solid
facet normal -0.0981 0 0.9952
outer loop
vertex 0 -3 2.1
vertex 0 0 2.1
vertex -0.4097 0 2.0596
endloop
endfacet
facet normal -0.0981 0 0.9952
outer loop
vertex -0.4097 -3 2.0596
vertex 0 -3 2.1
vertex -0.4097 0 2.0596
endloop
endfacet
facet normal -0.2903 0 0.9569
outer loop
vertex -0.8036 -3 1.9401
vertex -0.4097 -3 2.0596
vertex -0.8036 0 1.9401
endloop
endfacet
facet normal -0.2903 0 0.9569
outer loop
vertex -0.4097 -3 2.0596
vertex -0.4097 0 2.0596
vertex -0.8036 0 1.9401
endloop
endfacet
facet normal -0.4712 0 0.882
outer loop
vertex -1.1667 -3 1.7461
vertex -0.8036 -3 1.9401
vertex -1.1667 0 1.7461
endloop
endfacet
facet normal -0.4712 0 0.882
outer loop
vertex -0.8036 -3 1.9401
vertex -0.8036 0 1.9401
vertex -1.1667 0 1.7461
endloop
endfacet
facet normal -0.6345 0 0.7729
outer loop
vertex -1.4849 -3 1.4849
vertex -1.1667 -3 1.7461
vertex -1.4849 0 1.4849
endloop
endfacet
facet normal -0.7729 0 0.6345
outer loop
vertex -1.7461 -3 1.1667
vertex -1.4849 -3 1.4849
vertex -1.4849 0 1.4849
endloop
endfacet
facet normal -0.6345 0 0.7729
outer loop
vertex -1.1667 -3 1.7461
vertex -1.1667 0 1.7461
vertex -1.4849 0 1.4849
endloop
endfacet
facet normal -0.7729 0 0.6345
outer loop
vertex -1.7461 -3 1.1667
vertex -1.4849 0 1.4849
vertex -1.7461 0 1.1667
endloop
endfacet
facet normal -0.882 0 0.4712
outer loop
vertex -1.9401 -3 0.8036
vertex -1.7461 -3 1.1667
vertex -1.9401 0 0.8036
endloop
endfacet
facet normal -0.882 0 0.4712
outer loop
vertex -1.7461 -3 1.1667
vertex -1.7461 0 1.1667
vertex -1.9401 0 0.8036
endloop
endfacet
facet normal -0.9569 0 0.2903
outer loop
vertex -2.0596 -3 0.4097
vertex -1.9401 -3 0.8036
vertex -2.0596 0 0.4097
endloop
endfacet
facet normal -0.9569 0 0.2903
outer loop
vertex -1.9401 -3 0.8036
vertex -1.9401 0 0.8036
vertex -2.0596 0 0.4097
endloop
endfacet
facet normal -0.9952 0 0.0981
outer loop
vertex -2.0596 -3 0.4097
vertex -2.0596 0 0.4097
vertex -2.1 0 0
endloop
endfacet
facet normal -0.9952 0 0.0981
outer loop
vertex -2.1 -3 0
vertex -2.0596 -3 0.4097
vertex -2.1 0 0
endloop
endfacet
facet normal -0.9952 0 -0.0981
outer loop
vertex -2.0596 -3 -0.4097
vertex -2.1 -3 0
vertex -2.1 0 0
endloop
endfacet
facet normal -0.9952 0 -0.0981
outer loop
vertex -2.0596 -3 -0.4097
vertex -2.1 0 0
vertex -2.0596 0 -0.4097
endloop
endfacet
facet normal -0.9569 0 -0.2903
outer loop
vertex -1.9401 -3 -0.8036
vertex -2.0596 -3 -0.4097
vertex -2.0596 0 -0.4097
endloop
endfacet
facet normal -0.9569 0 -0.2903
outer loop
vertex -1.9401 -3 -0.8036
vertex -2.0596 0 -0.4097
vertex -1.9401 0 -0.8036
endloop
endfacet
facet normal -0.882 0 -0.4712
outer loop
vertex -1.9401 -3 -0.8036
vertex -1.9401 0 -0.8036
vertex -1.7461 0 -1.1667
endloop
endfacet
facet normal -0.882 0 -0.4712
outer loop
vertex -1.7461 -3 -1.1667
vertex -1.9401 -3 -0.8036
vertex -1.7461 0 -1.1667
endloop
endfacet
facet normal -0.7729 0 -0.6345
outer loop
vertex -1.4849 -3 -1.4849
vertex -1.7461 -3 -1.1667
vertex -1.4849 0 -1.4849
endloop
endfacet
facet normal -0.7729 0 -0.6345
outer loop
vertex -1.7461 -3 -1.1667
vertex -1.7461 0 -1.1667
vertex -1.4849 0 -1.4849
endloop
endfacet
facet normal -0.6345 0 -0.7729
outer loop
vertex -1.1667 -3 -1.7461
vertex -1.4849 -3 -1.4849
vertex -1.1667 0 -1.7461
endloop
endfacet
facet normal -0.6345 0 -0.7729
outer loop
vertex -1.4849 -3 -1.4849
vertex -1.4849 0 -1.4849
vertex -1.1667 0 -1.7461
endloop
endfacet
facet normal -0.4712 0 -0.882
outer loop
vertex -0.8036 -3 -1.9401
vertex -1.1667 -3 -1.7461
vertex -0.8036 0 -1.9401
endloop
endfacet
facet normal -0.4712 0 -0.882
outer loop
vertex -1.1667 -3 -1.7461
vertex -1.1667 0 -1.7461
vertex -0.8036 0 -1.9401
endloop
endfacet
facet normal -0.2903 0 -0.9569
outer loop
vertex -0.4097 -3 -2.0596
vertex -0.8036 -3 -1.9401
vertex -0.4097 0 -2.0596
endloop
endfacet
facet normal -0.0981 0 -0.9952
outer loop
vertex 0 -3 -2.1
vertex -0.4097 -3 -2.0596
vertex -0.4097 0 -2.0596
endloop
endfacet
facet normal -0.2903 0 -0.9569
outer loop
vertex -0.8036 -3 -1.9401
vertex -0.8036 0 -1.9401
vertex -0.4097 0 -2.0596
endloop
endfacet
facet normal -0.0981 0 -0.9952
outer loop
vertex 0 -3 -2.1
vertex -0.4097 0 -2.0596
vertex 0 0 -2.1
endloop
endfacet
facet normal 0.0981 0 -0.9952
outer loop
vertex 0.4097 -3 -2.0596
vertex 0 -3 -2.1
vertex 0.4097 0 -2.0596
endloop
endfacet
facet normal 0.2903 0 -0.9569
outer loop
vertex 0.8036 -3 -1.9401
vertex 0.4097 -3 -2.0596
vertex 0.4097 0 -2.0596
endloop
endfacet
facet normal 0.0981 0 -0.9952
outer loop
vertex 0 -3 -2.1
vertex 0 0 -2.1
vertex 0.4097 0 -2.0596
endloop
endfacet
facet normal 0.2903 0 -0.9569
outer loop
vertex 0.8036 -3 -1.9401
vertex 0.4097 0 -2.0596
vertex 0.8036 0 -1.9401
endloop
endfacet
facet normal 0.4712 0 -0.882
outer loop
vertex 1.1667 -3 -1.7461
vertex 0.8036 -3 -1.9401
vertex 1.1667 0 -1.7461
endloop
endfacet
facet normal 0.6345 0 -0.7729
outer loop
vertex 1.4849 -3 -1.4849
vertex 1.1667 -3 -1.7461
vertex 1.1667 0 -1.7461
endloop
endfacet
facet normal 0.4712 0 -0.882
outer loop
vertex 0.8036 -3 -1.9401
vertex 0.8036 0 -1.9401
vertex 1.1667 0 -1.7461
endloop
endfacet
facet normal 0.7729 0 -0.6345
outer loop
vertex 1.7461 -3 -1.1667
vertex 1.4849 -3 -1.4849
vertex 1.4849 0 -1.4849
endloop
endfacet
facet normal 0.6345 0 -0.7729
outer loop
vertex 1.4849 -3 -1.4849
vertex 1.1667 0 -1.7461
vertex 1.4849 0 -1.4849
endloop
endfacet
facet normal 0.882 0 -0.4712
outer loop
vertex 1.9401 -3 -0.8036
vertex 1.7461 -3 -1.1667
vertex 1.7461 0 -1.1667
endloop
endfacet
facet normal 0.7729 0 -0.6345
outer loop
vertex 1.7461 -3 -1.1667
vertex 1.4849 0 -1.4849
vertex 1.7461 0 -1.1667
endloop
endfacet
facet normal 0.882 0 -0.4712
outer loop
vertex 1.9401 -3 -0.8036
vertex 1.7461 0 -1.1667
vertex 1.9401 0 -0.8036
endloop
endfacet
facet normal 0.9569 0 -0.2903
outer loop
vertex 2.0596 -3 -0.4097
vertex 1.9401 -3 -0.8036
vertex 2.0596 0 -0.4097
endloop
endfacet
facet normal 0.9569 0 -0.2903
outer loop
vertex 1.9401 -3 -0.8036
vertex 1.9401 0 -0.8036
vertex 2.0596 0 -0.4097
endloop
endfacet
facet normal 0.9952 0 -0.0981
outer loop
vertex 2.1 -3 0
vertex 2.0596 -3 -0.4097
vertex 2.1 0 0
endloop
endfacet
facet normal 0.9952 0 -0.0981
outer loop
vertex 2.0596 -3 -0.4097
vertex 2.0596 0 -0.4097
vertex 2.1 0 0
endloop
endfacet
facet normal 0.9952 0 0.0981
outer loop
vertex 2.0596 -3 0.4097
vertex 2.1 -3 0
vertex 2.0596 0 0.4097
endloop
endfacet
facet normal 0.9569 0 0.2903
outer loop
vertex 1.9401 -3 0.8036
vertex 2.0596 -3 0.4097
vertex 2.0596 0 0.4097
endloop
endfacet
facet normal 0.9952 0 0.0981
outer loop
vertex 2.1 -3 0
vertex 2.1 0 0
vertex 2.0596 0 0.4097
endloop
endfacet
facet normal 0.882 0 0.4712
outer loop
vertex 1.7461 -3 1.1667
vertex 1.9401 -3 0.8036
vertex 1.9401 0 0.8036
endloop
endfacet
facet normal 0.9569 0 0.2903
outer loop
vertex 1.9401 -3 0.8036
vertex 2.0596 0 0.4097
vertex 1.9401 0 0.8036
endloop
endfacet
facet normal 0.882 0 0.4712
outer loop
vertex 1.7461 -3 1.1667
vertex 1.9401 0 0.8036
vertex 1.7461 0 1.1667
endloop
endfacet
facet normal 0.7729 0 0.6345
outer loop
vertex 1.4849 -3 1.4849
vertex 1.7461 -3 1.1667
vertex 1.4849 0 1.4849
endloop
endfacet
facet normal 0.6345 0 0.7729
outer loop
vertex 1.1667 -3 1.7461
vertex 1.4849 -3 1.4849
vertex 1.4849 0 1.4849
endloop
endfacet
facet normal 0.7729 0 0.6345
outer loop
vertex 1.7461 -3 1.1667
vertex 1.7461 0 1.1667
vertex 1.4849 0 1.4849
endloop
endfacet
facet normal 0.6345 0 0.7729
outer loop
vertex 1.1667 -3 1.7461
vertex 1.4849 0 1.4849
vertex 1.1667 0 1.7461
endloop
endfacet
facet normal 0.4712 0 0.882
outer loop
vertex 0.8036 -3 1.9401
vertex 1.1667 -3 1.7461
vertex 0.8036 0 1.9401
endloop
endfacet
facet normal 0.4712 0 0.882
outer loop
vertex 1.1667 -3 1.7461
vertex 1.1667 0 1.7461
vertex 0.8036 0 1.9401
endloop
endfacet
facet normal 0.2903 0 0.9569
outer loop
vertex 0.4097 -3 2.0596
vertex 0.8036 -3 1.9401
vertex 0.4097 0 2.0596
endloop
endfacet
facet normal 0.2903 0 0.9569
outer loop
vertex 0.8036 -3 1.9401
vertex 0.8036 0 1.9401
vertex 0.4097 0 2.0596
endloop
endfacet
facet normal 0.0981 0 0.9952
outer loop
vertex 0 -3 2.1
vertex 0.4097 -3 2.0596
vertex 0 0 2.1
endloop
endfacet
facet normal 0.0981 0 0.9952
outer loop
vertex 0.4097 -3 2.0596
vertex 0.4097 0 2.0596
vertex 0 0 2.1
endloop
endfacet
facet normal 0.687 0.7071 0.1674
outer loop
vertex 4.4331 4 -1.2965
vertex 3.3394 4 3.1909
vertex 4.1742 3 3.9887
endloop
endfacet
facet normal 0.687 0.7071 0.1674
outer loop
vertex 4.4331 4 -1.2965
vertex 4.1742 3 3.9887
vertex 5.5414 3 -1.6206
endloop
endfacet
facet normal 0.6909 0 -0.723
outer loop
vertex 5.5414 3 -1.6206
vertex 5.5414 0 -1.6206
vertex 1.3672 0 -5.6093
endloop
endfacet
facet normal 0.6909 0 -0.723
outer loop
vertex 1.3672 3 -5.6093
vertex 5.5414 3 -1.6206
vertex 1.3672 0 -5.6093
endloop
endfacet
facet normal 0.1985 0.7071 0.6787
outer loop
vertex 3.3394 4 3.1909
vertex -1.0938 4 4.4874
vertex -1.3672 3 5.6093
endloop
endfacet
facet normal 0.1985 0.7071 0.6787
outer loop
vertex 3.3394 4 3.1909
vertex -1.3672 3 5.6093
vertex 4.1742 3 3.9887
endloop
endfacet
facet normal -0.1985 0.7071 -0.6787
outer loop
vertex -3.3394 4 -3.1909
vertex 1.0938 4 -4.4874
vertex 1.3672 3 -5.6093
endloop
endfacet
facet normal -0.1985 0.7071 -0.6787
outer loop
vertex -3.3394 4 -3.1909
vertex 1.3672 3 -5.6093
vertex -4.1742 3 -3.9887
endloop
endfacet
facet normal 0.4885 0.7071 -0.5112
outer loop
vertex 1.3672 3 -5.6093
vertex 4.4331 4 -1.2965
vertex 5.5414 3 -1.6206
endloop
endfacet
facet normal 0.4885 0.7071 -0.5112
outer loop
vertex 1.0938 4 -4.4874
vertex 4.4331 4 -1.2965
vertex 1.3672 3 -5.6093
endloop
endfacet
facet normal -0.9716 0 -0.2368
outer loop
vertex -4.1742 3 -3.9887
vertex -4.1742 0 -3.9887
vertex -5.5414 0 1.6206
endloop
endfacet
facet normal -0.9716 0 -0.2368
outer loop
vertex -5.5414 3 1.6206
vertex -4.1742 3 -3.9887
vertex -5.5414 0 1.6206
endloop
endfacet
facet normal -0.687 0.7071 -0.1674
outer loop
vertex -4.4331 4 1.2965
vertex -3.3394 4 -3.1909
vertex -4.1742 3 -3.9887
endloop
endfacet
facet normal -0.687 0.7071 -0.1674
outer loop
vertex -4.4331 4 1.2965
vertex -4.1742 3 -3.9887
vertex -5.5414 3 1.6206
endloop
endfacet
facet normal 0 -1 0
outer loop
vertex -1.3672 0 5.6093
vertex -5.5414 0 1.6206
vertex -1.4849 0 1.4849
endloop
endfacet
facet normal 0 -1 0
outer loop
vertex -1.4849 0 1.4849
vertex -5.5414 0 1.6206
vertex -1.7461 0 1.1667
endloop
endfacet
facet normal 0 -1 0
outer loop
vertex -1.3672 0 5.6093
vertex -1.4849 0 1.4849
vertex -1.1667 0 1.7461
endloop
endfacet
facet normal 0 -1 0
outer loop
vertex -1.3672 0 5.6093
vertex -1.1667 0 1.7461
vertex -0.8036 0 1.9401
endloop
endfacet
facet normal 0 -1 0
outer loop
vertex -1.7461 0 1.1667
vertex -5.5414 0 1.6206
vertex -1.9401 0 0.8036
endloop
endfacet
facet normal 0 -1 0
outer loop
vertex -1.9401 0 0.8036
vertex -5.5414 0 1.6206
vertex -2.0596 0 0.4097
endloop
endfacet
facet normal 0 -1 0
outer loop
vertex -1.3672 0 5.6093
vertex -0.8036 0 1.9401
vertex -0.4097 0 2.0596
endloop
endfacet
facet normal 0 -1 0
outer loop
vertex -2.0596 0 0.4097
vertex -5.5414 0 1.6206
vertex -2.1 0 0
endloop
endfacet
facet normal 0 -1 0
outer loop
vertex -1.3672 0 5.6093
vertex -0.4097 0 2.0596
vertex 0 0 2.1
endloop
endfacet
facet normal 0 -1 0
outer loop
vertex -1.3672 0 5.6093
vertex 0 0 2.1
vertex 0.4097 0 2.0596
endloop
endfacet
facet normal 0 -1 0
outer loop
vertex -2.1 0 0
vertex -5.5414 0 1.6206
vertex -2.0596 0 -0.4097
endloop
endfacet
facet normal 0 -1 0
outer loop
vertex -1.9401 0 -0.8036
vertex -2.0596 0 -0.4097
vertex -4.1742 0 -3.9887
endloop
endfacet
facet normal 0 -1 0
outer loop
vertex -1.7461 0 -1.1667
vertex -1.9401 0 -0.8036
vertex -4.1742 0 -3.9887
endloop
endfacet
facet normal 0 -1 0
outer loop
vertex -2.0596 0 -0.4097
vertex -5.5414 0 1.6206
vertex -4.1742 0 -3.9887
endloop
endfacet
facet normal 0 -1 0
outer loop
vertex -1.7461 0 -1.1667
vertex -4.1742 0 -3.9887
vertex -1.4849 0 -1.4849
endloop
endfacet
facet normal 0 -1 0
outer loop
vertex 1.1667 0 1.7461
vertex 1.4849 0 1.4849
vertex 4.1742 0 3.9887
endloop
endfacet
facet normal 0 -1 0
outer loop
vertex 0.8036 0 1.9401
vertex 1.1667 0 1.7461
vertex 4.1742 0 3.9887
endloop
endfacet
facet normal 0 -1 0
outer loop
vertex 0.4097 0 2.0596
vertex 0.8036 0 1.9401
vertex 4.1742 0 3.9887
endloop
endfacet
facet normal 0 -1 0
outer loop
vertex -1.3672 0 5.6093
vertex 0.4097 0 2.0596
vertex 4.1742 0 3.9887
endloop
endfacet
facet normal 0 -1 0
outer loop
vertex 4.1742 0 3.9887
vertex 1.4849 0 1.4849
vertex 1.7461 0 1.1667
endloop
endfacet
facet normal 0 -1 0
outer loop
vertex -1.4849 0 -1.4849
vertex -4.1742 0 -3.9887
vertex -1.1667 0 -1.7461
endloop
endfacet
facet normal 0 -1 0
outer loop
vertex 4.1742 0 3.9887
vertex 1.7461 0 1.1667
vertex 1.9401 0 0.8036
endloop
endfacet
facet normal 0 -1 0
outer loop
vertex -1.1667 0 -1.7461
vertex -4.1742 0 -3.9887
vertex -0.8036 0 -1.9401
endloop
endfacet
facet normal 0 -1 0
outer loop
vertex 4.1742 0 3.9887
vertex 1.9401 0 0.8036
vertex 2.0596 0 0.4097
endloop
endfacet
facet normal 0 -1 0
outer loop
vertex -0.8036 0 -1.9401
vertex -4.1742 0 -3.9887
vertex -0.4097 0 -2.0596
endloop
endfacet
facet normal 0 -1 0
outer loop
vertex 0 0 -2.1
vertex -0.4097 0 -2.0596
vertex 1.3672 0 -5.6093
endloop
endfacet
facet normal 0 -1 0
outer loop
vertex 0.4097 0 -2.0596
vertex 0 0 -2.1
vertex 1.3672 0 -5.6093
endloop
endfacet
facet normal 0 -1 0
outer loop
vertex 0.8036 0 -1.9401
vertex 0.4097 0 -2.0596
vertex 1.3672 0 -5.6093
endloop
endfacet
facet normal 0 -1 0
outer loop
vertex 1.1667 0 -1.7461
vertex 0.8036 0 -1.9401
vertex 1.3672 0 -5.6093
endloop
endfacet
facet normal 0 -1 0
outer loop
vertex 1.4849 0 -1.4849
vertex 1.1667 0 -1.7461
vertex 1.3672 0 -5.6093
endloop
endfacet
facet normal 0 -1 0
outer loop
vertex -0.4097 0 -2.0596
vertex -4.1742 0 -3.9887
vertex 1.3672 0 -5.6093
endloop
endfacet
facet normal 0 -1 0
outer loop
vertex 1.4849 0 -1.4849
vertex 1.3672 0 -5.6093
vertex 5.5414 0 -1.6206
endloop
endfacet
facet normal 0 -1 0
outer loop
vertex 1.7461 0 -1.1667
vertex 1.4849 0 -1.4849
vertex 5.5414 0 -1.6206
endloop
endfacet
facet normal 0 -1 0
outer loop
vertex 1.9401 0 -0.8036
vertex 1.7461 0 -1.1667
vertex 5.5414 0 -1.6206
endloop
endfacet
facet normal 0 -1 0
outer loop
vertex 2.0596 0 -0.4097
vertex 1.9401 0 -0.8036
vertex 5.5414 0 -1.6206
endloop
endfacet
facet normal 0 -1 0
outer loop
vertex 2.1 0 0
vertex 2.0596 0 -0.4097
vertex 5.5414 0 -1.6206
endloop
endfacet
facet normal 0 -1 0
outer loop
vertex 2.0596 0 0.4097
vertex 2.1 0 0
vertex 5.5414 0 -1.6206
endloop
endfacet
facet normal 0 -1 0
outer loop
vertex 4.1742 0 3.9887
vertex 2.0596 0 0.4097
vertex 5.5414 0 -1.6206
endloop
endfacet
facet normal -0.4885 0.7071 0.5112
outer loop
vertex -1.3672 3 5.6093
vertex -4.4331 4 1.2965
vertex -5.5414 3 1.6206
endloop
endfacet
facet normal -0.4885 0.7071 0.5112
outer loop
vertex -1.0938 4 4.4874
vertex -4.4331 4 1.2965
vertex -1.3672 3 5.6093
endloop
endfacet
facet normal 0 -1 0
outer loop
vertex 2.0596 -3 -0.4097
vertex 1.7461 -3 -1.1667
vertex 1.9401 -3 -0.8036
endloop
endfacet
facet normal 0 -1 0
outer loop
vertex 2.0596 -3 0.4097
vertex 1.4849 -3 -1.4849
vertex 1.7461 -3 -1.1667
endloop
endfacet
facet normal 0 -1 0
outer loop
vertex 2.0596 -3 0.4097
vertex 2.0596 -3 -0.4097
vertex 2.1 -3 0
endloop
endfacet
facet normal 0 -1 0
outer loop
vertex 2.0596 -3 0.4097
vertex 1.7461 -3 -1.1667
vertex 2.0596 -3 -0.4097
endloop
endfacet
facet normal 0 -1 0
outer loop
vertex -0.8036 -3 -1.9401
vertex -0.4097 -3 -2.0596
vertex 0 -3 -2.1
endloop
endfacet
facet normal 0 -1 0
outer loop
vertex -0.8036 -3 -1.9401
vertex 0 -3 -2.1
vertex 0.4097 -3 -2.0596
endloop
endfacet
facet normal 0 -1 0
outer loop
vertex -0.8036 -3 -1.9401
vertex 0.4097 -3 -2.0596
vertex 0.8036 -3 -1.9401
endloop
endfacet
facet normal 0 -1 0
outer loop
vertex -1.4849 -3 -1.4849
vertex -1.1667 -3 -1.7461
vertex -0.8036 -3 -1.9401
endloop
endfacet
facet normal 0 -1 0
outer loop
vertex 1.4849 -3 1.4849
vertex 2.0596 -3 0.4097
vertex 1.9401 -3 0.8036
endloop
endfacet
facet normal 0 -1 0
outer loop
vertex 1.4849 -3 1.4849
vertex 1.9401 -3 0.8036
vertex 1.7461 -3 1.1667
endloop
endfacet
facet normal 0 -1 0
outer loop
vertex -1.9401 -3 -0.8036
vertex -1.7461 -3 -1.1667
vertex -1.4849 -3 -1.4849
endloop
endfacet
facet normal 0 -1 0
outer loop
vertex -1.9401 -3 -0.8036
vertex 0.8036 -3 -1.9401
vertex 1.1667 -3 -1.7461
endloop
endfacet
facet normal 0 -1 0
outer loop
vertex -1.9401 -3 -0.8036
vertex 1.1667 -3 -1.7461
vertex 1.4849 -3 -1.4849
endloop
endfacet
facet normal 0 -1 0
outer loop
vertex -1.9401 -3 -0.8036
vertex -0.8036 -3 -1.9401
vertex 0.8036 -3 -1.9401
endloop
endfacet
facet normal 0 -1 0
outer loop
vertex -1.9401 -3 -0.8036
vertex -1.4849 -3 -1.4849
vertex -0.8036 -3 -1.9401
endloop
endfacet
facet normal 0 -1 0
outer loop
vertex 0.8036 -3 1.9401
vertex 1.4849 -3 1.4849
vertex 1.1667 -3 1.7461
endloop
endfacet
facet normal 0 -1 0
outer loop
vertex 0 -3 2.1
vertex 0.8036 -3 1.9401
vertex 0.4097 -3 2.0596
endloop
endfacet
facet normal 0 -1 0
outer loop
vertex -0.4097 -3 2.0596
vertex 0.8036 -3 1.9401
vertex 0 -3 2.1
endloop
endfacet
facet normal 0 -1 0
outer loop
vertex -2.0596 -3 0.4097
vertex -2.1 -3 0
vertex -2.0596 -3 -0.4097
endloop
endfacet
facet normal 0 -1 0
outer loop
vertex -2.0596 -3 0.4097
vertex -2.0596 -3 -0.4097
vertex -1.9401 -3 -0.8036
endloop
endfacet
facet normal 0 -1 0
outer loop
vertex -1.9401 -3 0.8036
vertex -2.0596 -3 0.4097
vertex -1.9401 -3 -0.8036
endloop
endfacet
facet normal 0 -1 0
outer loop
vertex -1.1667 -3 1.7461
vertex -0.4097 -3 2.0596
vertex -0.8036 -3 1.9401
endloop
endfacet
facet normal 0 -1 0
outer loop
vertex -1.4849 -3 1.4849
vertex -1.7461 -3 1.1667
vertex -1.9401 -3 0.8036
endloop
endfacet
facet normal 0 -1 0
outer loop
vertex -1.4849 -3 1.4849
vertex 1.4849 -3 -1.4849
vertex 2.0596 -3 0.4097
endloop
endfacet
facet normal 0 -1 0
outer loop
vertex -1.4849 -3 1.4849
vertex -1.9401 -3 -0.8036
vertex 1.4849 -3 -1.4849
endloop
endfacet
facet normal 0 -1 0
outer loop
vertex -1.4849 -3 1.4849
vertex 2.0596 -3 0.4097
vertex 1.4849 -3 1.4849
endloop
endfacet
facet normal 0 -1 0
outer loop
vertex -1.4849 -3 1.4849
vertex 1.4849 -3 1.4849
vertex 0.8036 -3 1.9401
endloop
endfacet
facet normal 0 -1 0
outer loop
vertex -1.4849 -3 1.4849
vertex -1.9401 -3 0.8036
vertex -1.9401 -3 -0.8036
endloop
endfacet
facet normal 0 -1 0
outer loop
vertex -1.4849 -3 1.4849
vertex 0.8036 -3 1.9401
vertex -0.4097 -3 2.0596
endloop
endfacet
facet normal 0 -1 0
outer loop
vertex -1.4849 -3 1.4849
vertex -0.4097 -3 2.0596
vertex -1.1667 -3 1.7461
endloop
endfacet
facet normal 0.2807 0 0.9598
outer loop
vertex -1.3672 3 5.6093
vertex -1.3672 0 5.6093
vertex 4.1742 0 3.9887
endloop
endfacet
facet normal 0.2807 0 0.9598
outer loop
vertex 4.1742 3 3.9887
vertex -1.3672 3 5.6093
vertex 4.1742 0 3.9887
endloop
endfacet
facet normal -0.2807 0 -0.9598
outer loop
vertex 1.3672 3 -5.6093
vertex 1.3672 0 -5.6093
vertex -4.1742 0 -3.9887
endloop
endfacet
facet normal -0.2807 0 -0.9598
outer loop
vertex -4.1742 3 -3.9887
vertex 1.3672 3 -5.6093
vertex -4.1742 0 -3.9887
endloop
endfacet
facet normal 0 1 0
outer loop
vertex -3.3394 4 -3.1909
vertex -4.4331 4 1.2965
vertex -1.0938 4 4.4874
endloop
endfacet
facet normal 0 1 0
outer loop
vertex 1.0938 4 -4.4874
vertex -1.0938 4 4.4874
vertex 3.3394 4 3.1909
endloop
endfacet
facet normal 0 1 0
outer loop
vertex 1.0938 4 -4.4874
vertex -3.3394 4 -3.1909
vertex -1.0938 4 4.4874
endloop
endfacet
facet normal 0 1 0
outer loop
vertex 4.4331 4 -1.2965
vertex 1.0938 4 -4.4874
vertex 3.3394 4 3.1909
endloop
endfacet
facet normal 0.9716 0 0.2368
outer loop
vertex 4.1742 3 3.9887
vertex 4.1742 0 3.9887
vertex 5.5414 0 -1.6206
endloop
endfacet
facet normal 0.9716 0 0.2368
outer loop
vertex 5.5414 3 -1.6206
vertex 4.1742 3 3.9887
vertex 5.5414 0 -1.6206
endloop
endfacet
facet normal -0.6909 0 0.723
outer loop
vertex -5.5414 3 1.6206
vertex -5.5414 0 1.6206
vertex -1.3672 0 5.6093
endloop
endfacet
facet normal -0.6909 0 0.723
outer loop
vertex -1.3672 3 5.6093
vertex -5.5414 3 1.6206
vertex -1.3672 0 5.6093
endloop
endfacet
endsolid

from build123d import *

# Parameters (mm, degrees)
EXTRUDE_1_DEPTH = 4
CHAMFER_1_SIZE  = 1
SKETCH_2_R      = 2.1
EXTRUDE_2_DEPTH = 3


with BuildPart() as part:
    # 草图1 → 拉伸1 (new body)
    with BuildSketch(Plane(origin=(0, 0, 0), x_dir=(1, 0, 0), z_dir=(0, 1, 0))):
        Polygon((4.174188702, -3.988669204), (5.541383209, 1.620618854), (1.367194507, 5.609288058), (-4.174188702, 3.988669204), (-5.541383209, -1.620618854), (-1.367194507, -5.609288058), align=None)
    extrude(amount=EXTRUDE_1_DEPTH)

    # 倒角1
    chamfer_1_edges = [part.edges().sort_by_distance(p)[0] for p in [
        (3.454288858, 4, -3.614953456),
        (-1.403497097, 4, -4.798978631),
        (-4.857785955, 4, -1.184025175),
        (-3.454288858, 4, 3.614953456),
        (1.403497097, 4, 4.798978631),
        (4.857785955, 4, 1.184025175),
    ]]
    chamfer(chamfer_1_edges, length=CHAMFER_1_SIZE)

    # 草图2 → 拉伸2 (add)
    with BuildSketch(Plane.XZ):
        with Locations(Location((0, 0, 0), (0, 0, 90))):
            Circle(SKETCH_2_R)
    extrude(amount=EXTRUDE_2_DEPTH)


solid = part.part
